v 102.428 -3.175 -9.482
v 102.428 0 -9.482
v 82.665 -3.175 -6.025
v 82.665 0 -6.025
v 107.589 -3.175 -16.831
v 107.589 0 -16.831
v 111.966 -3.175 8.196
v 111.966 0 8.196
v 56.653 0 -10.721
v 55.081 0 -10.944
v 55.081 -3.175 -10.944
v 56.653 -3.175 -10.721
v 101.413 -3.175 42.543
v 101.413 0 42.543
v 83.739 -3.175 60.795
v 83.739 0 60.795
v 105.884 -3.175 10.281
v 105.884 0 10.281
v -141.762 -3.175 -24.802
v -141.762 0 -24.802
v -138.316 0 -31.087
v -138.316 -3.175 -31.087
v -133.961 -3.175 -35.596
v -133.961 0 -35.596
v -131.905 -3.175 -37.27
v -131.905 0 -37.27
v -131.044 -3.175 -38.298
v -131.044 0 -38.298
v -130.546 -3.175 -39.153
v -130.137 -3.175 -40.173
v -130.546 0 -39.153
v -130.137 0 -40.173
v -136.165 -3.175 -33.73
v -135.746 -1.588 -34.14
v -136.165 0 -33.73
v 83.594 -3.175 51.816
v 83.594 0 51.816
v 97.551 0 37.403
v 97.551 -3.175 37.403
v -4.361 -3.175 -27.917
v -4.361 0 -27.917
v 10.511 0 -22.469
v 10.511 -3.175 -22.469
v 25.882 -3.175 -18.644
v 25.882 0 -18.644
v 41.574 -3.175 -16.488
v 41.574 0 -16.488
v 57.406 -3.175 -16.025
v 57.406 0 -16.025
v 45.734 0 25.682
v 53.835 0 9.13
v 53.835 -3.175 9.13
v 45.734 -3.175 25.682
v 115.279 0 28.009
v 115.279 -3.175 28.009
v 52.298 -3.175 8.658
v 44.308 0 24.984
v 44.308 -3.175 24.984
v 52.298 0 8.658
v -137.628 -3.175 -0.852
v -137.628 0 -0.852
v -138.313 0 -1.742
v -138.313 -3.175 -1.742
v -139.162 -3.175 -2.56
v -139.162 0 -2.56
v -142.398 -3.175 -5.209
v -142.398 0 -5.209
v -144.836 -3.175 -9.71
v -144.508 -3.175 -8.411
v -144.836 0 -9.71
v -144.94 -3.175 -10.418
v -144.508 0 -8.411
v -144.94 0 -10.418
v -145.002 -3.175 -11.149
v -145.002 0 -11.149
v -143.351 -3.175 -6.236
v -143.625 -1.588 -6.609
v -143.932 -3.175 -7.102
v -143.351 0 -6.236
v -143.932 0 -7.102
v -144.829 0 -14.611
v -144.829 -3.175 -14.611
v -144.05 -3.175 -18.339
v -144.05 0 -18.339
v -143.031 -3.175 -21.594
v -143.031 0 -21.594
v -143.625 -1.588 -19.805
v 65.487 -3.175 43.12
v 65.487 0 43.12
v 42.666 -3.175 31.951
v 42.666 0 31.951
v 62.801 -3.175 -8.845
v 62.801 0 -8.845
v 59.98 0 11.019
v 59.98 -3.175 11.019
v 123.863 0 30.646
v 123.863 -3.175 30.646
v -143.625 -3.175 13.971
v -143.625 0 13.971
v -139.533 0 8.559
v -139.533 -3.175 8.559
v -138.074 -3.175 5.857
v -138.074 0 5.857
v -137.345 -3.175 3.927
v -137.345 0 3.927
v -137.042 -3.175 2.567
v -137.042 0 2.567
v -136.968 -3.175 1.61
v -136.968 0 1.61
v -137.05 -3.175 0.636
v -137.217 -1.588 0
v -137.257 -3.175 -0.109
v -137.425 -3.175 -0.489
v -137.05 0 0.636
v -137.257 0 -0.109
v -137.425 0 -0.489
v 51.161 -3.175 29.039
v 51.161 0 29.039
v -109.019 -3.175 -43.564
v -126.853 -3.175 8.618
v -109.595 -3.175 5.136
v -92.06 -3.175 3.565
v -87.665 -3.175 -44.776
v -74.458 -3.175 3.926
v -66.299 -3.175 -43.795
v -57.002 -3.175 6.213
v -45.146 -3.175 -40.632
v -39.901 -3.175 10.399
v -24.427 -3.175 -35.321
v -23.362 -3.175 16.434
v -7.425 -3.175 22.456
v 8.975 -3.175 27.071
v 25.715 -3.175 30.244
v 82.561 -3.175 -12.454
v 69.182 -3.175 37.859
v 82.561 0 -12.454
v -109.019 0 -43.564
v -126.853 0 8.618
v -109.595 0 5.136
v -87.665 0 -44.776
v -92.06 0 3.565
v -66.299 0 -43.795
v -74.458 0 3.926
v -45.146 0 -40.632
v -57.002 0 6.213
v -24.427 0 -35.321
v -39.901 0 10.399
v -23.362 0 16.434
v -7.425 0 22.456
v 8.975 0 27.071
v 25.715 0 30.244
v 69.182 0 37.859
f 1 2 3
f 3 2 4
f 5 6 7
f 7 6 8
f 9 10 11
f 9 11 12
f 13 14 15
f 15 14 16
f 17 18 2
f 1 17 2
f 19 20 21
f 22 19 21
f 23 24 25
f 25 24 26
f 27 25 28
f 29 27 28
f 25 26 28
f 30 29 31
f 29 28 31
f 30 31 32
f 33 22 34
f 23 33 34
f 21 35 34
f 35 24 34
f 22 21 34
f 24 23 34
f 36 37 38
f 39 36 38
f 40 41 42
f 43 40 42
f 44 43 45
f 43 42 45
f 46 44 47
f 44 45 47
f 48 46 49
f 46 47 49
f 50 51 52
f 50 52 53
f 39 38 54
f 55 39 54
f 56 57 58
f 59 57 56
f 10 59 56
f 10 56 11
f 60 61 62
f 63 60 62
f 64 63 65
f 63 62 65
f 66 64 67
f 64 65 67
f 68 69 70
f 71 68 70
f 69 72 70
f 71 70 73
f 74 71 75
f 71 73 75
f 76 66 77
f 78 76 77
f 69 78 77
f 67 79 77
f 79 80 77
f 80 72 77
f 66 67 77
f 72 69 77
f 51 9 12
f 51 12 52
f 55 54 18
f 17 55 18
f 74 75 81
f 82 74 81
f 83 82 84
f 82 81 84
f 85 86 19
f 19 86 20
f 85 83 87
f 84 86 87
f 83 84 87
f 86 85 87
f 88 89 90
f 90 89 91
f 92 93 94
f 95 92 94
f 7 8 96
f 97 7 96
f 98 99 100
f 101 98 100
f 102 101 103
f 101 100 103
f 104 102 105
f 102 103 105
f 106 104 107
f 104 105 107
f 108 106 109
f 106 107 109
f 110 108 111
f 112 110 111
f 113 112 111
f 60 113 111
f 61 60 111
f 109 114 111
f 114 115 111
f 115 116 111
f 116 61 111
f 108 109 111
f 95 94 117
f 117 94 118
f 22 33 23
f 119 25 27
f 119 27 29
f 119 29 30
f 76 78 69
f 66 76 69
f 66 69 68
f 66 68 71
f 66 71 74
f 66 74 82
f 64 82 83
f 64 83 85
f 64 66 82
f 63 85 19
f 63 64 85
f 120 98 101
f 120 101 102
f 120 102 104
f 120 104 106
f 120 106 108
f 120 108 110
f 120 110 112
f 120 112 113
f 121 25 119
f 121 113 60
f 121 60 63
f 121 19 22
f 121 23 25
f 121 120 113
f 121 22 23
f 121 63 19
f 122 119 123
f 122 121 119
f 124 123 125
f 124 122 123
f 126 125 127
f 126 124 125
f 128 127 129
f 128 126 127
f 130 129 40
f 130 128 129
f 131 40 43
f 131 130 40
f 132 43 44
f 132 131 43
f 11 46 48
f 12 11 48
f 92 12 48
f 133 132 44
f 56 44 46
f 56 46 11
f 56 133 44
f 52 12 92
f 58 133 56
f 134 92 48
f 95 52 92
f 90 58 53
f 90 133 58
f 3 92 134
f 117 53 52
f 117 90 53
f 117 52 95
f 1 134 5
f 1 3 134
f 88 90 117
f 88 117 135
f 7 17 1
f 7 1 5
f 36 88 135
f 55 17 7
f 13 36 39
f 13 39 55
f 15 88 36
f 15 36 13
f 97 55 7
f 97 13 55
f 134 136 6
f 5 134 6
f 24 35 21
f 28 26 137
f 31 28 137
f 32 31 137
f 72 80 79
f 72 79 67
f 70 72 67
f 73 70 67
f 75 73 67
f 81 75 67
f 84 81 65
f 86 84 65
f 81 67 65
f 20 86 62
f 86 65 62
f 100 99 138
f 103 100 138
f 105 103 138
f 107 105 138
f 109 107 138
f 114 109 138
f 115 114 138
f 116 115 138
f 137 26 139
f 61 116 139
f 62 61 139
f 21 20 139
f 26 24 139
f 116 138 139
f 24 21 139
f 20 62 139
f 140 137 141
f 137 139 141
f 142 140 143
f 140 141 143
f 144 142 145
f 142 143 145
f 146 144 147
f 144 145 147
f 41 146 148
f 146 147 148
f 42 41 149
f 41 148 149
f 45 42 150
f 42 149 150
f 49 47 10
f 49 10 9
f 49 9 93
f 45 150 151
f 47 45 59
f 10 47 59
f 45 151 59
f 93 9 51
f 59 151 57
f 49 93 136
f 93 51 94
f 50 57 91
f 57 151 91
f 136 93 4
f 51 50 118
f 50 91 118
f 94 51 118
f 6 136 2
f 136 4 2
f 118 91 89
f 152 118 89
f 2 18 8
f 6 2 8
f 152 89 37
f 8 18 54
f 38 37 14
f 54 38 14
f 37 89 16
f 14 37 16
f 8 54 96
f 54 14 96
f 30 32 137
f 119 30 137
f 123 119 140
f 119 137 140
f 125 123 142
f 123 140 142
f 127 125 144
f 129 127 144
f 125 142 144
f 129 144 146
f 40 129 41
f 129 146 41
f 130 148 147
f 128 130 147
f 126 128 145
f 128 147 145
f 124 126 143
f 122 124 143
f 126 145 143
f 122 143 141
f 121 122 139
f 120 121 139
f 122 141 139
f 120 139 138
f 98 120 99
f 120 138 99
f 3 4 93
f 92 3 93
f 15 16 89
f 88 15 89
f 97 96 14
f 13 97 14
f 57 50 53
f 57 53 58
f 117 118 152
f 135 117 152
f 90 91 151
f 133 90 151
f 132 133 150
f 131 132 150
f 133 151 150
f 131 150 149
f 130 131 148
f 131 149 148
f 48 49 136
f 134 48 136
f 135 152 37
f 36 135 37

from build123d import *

# Parameters (mm, degrees)
F1_DEPTH = 3.175
F3_DEPTH = 25.4


# Not quite as in the source:
# - a feature of the source that left no trace in its solid (it failed there, or was rolled back) is left out


with BuildPart() as f1:
    # F0 (on Front) → F1 (new body)
    with BuildSketch(Plane.XZ):
        Polygon((83.7385465681, 60.7950414864), (65.4867140893, 43.1201200129), (42.6659945136, 31.9511005402), (48.4525043638, 20.1278488249), (53.8348904797, 9.1303205178), (53.9749918148, 8.1434892953), (55.6890408221, -3.9297509459), (57.4061805077, -16.0247609861), (82.5613006616, -12.4537432078), (107.5886724448, -16.8312881314), (111.9661336404, 8.1960982966), (123.863112913, 30.645911706), (101.4134680417, 42.5432090075), align=None)
        Polygon((62.8005820601, -8.8453070311), (59.98049806, 11.018507533), (51.1609480861, 29.0390003787), (69.1816050409, 37.8587515602), (83.5943604063, 51.8159429598), (97.5514190703, 37.4033246624), (115.278932926, 28.0085434102), (105.884368679, 10.2808320666), (102.427683451, -9.4821750964), (82.6646160624, -6.0254111952), align=None, mode=Mode.SUBTRACT)
        with BuildLine():
            Line((48.4525043638, 20.1278488249), (42.6659945136, 31.9511005402))
            ThreePointArc((42.6659945136, 31.9511005402), (8.9754555579, 27.0708614751), (-23.3620781244, 16.433518583))
            ThreePointArc((-23.3620781244, 16.433518583), (-83.2539454778, 3.5037557836), (-143.6249151078, 13.9708741582))
            add(Edge.make_bspline(
                [(-143.6249151078, 13.9708741582), (-139.3821490751, 9.1987873198), (-135.7140854359, 2.9639524936), (-137.4607610868, -0.5827256571), (-137.6279600012, -0.8521879559)],
                knots=[0, 0, 0, 0, 0.2240060147, 0.243416319, 0.243416319, 0.243416319, 0.243416319], degree=3))
            ThreePointArc((-137.6279600012, -0.8521879559), (-77.5676001001, -8.3586658465), (-18.6118863058, 5.3459995187))
            ThreePointArc((-18.6118863058, 5.3459995187), (14.224158407, 15.8953190594), (48.4525043638, 20.1278488249))
        make_face()
        with BuildLine():
            Line((53.8348904797, 9.1303205178), (48.4525043638, 20.1278488249))
            ThreePointArc((48.4525043638, 20.1278488249), (14.224158407, 15.8953190594), (-18.6118863058, 5.3459995187))
            ThreePointArc((-18.6118863058, 5.3459995187), (-77.5676001001, -8.3586658465), (-137.6279600012, -0.8521879559))
            add(Edge.make_bspline(
                [(-137.6279600012, -0.8521879559), (-138.9540636818, -2.9893725644), (-143.6991899879, -4.9863421871), (-144.9043234797, -9.4137473987), (-145.0020824108, -11.1490770117)],
                knots=[0.243416319, 0.243416319, 0.243416319, 0.243416319, 0.3973651411, 0.4804221604, 0.4804221604, 0.4804221604, 0.4804221604], degree=3))
            ThreePointArc((-145.0020824108, -11.1490770117), (-78.9349092151, -20.4976327315), (-13.8616894677, -5.7415173951))
            ThreePointArc((-13.8616894677, -5.7415173951), (19.3499940642, 4.6534346359), (53.9749918148, 8.1434892953))
            Line((53.9749918148, 8.1434892953), (53.8348904797, 9.1303205178))
        make_face()
        with BuildLine():
            Line((55.6890408221, -3.9297509459), (53.9749918148, 8.1434892953))
            ThreePointArc((53.9749918148, 8.1434892953), (19.3499940642, 4.6534346359), (-13.8616894677, -5.7415173951))
            ThreePointArc((-13.8616894677, -5.7415173951), (-78.9349092151, -20.4976327315), (-145.0020824108, -11.1490770117))
            add(Edge.make_bspline(
                [(-145.0020824108, -11.1490770117), (-145.148620527, -13.7502913411), (-144.2433778815, -18.4324653045), (-142.4737649258, -23.1788138286), (-141.761803512, -24.8017401992)],
                knots=[0.4804221604, 0.4804221604, 0.4804221604, 0.4804221604, 0.6049224901, 0.6738209053, 0.6738209053, 0.6738209053, 0.6738209053], degree=3))
            ThreePointArc((-141.761803512, -24.8017401992), (-74.7426386358, -32.3624002943), (-9.11149777, -16.8290365111))
            ThreePointArc((-9.11149777, -16.8290365111), (22.6146775302, -6.9930314551), (55.6890408221, -3.9297509459))
        make_face()
        with BuildLine():
            Line((57.4061805077, -16.0247609861), (55.6890408221, -3.9297509459))
            ThreePointArc((55.6890408221, -3.9297509459), (22.6146775302, -6.9930314551), (-9.11149777, -16.8290365111))
            ThreePointArc((-9.11149777, -16.8290365111), (-74.7426386358, -32.3624002943), (-141.761803512, -24.8017401992))
            add(Edge.make_bspline(
                [(-141.761803512, -24.8017401992), (-140.0858053256, -28.6222023777), (-135.8065528754, -35.5480454062), (-131.1858892441, -36.9351543486), (-130.136887087, -40.1733894927)],
                knots=[0.6738209053, 0.6738209053, 0.6738209053, 0.6738209053, 0.8360117443, 1, 1, 1, 1], degree=3))
            ThreePointArc((-130.136887087, -40.1733894927), (-66.2989601616, -43.7949576201), (-4.3613058839, -27.9165555465))
            ThreePointArc((-4.3613058839, -27.9165555465), (25.8820678715, -18.6444983253), (57.4061805077, -16.0247609861))
        make_face()
    extrude(amount=F1_DEPTH)

    # F2 (on Front) → F3 (cut)
    with BuildSketch(Plane.XZ):
        Polygon((56.6531529851, -10.7206639914), (53.8348904797, 9.1303205178), (45.7340942467, 25.6822240721), (44.3082079533, 24.9843699385), (52.2984898455, 8.6582741514), (55.0814150388, -10.9438050714), align=None)
    extrude(amount=F3_DEPTH, mode=Mode.SUBTRACT)


solid = f1.part
